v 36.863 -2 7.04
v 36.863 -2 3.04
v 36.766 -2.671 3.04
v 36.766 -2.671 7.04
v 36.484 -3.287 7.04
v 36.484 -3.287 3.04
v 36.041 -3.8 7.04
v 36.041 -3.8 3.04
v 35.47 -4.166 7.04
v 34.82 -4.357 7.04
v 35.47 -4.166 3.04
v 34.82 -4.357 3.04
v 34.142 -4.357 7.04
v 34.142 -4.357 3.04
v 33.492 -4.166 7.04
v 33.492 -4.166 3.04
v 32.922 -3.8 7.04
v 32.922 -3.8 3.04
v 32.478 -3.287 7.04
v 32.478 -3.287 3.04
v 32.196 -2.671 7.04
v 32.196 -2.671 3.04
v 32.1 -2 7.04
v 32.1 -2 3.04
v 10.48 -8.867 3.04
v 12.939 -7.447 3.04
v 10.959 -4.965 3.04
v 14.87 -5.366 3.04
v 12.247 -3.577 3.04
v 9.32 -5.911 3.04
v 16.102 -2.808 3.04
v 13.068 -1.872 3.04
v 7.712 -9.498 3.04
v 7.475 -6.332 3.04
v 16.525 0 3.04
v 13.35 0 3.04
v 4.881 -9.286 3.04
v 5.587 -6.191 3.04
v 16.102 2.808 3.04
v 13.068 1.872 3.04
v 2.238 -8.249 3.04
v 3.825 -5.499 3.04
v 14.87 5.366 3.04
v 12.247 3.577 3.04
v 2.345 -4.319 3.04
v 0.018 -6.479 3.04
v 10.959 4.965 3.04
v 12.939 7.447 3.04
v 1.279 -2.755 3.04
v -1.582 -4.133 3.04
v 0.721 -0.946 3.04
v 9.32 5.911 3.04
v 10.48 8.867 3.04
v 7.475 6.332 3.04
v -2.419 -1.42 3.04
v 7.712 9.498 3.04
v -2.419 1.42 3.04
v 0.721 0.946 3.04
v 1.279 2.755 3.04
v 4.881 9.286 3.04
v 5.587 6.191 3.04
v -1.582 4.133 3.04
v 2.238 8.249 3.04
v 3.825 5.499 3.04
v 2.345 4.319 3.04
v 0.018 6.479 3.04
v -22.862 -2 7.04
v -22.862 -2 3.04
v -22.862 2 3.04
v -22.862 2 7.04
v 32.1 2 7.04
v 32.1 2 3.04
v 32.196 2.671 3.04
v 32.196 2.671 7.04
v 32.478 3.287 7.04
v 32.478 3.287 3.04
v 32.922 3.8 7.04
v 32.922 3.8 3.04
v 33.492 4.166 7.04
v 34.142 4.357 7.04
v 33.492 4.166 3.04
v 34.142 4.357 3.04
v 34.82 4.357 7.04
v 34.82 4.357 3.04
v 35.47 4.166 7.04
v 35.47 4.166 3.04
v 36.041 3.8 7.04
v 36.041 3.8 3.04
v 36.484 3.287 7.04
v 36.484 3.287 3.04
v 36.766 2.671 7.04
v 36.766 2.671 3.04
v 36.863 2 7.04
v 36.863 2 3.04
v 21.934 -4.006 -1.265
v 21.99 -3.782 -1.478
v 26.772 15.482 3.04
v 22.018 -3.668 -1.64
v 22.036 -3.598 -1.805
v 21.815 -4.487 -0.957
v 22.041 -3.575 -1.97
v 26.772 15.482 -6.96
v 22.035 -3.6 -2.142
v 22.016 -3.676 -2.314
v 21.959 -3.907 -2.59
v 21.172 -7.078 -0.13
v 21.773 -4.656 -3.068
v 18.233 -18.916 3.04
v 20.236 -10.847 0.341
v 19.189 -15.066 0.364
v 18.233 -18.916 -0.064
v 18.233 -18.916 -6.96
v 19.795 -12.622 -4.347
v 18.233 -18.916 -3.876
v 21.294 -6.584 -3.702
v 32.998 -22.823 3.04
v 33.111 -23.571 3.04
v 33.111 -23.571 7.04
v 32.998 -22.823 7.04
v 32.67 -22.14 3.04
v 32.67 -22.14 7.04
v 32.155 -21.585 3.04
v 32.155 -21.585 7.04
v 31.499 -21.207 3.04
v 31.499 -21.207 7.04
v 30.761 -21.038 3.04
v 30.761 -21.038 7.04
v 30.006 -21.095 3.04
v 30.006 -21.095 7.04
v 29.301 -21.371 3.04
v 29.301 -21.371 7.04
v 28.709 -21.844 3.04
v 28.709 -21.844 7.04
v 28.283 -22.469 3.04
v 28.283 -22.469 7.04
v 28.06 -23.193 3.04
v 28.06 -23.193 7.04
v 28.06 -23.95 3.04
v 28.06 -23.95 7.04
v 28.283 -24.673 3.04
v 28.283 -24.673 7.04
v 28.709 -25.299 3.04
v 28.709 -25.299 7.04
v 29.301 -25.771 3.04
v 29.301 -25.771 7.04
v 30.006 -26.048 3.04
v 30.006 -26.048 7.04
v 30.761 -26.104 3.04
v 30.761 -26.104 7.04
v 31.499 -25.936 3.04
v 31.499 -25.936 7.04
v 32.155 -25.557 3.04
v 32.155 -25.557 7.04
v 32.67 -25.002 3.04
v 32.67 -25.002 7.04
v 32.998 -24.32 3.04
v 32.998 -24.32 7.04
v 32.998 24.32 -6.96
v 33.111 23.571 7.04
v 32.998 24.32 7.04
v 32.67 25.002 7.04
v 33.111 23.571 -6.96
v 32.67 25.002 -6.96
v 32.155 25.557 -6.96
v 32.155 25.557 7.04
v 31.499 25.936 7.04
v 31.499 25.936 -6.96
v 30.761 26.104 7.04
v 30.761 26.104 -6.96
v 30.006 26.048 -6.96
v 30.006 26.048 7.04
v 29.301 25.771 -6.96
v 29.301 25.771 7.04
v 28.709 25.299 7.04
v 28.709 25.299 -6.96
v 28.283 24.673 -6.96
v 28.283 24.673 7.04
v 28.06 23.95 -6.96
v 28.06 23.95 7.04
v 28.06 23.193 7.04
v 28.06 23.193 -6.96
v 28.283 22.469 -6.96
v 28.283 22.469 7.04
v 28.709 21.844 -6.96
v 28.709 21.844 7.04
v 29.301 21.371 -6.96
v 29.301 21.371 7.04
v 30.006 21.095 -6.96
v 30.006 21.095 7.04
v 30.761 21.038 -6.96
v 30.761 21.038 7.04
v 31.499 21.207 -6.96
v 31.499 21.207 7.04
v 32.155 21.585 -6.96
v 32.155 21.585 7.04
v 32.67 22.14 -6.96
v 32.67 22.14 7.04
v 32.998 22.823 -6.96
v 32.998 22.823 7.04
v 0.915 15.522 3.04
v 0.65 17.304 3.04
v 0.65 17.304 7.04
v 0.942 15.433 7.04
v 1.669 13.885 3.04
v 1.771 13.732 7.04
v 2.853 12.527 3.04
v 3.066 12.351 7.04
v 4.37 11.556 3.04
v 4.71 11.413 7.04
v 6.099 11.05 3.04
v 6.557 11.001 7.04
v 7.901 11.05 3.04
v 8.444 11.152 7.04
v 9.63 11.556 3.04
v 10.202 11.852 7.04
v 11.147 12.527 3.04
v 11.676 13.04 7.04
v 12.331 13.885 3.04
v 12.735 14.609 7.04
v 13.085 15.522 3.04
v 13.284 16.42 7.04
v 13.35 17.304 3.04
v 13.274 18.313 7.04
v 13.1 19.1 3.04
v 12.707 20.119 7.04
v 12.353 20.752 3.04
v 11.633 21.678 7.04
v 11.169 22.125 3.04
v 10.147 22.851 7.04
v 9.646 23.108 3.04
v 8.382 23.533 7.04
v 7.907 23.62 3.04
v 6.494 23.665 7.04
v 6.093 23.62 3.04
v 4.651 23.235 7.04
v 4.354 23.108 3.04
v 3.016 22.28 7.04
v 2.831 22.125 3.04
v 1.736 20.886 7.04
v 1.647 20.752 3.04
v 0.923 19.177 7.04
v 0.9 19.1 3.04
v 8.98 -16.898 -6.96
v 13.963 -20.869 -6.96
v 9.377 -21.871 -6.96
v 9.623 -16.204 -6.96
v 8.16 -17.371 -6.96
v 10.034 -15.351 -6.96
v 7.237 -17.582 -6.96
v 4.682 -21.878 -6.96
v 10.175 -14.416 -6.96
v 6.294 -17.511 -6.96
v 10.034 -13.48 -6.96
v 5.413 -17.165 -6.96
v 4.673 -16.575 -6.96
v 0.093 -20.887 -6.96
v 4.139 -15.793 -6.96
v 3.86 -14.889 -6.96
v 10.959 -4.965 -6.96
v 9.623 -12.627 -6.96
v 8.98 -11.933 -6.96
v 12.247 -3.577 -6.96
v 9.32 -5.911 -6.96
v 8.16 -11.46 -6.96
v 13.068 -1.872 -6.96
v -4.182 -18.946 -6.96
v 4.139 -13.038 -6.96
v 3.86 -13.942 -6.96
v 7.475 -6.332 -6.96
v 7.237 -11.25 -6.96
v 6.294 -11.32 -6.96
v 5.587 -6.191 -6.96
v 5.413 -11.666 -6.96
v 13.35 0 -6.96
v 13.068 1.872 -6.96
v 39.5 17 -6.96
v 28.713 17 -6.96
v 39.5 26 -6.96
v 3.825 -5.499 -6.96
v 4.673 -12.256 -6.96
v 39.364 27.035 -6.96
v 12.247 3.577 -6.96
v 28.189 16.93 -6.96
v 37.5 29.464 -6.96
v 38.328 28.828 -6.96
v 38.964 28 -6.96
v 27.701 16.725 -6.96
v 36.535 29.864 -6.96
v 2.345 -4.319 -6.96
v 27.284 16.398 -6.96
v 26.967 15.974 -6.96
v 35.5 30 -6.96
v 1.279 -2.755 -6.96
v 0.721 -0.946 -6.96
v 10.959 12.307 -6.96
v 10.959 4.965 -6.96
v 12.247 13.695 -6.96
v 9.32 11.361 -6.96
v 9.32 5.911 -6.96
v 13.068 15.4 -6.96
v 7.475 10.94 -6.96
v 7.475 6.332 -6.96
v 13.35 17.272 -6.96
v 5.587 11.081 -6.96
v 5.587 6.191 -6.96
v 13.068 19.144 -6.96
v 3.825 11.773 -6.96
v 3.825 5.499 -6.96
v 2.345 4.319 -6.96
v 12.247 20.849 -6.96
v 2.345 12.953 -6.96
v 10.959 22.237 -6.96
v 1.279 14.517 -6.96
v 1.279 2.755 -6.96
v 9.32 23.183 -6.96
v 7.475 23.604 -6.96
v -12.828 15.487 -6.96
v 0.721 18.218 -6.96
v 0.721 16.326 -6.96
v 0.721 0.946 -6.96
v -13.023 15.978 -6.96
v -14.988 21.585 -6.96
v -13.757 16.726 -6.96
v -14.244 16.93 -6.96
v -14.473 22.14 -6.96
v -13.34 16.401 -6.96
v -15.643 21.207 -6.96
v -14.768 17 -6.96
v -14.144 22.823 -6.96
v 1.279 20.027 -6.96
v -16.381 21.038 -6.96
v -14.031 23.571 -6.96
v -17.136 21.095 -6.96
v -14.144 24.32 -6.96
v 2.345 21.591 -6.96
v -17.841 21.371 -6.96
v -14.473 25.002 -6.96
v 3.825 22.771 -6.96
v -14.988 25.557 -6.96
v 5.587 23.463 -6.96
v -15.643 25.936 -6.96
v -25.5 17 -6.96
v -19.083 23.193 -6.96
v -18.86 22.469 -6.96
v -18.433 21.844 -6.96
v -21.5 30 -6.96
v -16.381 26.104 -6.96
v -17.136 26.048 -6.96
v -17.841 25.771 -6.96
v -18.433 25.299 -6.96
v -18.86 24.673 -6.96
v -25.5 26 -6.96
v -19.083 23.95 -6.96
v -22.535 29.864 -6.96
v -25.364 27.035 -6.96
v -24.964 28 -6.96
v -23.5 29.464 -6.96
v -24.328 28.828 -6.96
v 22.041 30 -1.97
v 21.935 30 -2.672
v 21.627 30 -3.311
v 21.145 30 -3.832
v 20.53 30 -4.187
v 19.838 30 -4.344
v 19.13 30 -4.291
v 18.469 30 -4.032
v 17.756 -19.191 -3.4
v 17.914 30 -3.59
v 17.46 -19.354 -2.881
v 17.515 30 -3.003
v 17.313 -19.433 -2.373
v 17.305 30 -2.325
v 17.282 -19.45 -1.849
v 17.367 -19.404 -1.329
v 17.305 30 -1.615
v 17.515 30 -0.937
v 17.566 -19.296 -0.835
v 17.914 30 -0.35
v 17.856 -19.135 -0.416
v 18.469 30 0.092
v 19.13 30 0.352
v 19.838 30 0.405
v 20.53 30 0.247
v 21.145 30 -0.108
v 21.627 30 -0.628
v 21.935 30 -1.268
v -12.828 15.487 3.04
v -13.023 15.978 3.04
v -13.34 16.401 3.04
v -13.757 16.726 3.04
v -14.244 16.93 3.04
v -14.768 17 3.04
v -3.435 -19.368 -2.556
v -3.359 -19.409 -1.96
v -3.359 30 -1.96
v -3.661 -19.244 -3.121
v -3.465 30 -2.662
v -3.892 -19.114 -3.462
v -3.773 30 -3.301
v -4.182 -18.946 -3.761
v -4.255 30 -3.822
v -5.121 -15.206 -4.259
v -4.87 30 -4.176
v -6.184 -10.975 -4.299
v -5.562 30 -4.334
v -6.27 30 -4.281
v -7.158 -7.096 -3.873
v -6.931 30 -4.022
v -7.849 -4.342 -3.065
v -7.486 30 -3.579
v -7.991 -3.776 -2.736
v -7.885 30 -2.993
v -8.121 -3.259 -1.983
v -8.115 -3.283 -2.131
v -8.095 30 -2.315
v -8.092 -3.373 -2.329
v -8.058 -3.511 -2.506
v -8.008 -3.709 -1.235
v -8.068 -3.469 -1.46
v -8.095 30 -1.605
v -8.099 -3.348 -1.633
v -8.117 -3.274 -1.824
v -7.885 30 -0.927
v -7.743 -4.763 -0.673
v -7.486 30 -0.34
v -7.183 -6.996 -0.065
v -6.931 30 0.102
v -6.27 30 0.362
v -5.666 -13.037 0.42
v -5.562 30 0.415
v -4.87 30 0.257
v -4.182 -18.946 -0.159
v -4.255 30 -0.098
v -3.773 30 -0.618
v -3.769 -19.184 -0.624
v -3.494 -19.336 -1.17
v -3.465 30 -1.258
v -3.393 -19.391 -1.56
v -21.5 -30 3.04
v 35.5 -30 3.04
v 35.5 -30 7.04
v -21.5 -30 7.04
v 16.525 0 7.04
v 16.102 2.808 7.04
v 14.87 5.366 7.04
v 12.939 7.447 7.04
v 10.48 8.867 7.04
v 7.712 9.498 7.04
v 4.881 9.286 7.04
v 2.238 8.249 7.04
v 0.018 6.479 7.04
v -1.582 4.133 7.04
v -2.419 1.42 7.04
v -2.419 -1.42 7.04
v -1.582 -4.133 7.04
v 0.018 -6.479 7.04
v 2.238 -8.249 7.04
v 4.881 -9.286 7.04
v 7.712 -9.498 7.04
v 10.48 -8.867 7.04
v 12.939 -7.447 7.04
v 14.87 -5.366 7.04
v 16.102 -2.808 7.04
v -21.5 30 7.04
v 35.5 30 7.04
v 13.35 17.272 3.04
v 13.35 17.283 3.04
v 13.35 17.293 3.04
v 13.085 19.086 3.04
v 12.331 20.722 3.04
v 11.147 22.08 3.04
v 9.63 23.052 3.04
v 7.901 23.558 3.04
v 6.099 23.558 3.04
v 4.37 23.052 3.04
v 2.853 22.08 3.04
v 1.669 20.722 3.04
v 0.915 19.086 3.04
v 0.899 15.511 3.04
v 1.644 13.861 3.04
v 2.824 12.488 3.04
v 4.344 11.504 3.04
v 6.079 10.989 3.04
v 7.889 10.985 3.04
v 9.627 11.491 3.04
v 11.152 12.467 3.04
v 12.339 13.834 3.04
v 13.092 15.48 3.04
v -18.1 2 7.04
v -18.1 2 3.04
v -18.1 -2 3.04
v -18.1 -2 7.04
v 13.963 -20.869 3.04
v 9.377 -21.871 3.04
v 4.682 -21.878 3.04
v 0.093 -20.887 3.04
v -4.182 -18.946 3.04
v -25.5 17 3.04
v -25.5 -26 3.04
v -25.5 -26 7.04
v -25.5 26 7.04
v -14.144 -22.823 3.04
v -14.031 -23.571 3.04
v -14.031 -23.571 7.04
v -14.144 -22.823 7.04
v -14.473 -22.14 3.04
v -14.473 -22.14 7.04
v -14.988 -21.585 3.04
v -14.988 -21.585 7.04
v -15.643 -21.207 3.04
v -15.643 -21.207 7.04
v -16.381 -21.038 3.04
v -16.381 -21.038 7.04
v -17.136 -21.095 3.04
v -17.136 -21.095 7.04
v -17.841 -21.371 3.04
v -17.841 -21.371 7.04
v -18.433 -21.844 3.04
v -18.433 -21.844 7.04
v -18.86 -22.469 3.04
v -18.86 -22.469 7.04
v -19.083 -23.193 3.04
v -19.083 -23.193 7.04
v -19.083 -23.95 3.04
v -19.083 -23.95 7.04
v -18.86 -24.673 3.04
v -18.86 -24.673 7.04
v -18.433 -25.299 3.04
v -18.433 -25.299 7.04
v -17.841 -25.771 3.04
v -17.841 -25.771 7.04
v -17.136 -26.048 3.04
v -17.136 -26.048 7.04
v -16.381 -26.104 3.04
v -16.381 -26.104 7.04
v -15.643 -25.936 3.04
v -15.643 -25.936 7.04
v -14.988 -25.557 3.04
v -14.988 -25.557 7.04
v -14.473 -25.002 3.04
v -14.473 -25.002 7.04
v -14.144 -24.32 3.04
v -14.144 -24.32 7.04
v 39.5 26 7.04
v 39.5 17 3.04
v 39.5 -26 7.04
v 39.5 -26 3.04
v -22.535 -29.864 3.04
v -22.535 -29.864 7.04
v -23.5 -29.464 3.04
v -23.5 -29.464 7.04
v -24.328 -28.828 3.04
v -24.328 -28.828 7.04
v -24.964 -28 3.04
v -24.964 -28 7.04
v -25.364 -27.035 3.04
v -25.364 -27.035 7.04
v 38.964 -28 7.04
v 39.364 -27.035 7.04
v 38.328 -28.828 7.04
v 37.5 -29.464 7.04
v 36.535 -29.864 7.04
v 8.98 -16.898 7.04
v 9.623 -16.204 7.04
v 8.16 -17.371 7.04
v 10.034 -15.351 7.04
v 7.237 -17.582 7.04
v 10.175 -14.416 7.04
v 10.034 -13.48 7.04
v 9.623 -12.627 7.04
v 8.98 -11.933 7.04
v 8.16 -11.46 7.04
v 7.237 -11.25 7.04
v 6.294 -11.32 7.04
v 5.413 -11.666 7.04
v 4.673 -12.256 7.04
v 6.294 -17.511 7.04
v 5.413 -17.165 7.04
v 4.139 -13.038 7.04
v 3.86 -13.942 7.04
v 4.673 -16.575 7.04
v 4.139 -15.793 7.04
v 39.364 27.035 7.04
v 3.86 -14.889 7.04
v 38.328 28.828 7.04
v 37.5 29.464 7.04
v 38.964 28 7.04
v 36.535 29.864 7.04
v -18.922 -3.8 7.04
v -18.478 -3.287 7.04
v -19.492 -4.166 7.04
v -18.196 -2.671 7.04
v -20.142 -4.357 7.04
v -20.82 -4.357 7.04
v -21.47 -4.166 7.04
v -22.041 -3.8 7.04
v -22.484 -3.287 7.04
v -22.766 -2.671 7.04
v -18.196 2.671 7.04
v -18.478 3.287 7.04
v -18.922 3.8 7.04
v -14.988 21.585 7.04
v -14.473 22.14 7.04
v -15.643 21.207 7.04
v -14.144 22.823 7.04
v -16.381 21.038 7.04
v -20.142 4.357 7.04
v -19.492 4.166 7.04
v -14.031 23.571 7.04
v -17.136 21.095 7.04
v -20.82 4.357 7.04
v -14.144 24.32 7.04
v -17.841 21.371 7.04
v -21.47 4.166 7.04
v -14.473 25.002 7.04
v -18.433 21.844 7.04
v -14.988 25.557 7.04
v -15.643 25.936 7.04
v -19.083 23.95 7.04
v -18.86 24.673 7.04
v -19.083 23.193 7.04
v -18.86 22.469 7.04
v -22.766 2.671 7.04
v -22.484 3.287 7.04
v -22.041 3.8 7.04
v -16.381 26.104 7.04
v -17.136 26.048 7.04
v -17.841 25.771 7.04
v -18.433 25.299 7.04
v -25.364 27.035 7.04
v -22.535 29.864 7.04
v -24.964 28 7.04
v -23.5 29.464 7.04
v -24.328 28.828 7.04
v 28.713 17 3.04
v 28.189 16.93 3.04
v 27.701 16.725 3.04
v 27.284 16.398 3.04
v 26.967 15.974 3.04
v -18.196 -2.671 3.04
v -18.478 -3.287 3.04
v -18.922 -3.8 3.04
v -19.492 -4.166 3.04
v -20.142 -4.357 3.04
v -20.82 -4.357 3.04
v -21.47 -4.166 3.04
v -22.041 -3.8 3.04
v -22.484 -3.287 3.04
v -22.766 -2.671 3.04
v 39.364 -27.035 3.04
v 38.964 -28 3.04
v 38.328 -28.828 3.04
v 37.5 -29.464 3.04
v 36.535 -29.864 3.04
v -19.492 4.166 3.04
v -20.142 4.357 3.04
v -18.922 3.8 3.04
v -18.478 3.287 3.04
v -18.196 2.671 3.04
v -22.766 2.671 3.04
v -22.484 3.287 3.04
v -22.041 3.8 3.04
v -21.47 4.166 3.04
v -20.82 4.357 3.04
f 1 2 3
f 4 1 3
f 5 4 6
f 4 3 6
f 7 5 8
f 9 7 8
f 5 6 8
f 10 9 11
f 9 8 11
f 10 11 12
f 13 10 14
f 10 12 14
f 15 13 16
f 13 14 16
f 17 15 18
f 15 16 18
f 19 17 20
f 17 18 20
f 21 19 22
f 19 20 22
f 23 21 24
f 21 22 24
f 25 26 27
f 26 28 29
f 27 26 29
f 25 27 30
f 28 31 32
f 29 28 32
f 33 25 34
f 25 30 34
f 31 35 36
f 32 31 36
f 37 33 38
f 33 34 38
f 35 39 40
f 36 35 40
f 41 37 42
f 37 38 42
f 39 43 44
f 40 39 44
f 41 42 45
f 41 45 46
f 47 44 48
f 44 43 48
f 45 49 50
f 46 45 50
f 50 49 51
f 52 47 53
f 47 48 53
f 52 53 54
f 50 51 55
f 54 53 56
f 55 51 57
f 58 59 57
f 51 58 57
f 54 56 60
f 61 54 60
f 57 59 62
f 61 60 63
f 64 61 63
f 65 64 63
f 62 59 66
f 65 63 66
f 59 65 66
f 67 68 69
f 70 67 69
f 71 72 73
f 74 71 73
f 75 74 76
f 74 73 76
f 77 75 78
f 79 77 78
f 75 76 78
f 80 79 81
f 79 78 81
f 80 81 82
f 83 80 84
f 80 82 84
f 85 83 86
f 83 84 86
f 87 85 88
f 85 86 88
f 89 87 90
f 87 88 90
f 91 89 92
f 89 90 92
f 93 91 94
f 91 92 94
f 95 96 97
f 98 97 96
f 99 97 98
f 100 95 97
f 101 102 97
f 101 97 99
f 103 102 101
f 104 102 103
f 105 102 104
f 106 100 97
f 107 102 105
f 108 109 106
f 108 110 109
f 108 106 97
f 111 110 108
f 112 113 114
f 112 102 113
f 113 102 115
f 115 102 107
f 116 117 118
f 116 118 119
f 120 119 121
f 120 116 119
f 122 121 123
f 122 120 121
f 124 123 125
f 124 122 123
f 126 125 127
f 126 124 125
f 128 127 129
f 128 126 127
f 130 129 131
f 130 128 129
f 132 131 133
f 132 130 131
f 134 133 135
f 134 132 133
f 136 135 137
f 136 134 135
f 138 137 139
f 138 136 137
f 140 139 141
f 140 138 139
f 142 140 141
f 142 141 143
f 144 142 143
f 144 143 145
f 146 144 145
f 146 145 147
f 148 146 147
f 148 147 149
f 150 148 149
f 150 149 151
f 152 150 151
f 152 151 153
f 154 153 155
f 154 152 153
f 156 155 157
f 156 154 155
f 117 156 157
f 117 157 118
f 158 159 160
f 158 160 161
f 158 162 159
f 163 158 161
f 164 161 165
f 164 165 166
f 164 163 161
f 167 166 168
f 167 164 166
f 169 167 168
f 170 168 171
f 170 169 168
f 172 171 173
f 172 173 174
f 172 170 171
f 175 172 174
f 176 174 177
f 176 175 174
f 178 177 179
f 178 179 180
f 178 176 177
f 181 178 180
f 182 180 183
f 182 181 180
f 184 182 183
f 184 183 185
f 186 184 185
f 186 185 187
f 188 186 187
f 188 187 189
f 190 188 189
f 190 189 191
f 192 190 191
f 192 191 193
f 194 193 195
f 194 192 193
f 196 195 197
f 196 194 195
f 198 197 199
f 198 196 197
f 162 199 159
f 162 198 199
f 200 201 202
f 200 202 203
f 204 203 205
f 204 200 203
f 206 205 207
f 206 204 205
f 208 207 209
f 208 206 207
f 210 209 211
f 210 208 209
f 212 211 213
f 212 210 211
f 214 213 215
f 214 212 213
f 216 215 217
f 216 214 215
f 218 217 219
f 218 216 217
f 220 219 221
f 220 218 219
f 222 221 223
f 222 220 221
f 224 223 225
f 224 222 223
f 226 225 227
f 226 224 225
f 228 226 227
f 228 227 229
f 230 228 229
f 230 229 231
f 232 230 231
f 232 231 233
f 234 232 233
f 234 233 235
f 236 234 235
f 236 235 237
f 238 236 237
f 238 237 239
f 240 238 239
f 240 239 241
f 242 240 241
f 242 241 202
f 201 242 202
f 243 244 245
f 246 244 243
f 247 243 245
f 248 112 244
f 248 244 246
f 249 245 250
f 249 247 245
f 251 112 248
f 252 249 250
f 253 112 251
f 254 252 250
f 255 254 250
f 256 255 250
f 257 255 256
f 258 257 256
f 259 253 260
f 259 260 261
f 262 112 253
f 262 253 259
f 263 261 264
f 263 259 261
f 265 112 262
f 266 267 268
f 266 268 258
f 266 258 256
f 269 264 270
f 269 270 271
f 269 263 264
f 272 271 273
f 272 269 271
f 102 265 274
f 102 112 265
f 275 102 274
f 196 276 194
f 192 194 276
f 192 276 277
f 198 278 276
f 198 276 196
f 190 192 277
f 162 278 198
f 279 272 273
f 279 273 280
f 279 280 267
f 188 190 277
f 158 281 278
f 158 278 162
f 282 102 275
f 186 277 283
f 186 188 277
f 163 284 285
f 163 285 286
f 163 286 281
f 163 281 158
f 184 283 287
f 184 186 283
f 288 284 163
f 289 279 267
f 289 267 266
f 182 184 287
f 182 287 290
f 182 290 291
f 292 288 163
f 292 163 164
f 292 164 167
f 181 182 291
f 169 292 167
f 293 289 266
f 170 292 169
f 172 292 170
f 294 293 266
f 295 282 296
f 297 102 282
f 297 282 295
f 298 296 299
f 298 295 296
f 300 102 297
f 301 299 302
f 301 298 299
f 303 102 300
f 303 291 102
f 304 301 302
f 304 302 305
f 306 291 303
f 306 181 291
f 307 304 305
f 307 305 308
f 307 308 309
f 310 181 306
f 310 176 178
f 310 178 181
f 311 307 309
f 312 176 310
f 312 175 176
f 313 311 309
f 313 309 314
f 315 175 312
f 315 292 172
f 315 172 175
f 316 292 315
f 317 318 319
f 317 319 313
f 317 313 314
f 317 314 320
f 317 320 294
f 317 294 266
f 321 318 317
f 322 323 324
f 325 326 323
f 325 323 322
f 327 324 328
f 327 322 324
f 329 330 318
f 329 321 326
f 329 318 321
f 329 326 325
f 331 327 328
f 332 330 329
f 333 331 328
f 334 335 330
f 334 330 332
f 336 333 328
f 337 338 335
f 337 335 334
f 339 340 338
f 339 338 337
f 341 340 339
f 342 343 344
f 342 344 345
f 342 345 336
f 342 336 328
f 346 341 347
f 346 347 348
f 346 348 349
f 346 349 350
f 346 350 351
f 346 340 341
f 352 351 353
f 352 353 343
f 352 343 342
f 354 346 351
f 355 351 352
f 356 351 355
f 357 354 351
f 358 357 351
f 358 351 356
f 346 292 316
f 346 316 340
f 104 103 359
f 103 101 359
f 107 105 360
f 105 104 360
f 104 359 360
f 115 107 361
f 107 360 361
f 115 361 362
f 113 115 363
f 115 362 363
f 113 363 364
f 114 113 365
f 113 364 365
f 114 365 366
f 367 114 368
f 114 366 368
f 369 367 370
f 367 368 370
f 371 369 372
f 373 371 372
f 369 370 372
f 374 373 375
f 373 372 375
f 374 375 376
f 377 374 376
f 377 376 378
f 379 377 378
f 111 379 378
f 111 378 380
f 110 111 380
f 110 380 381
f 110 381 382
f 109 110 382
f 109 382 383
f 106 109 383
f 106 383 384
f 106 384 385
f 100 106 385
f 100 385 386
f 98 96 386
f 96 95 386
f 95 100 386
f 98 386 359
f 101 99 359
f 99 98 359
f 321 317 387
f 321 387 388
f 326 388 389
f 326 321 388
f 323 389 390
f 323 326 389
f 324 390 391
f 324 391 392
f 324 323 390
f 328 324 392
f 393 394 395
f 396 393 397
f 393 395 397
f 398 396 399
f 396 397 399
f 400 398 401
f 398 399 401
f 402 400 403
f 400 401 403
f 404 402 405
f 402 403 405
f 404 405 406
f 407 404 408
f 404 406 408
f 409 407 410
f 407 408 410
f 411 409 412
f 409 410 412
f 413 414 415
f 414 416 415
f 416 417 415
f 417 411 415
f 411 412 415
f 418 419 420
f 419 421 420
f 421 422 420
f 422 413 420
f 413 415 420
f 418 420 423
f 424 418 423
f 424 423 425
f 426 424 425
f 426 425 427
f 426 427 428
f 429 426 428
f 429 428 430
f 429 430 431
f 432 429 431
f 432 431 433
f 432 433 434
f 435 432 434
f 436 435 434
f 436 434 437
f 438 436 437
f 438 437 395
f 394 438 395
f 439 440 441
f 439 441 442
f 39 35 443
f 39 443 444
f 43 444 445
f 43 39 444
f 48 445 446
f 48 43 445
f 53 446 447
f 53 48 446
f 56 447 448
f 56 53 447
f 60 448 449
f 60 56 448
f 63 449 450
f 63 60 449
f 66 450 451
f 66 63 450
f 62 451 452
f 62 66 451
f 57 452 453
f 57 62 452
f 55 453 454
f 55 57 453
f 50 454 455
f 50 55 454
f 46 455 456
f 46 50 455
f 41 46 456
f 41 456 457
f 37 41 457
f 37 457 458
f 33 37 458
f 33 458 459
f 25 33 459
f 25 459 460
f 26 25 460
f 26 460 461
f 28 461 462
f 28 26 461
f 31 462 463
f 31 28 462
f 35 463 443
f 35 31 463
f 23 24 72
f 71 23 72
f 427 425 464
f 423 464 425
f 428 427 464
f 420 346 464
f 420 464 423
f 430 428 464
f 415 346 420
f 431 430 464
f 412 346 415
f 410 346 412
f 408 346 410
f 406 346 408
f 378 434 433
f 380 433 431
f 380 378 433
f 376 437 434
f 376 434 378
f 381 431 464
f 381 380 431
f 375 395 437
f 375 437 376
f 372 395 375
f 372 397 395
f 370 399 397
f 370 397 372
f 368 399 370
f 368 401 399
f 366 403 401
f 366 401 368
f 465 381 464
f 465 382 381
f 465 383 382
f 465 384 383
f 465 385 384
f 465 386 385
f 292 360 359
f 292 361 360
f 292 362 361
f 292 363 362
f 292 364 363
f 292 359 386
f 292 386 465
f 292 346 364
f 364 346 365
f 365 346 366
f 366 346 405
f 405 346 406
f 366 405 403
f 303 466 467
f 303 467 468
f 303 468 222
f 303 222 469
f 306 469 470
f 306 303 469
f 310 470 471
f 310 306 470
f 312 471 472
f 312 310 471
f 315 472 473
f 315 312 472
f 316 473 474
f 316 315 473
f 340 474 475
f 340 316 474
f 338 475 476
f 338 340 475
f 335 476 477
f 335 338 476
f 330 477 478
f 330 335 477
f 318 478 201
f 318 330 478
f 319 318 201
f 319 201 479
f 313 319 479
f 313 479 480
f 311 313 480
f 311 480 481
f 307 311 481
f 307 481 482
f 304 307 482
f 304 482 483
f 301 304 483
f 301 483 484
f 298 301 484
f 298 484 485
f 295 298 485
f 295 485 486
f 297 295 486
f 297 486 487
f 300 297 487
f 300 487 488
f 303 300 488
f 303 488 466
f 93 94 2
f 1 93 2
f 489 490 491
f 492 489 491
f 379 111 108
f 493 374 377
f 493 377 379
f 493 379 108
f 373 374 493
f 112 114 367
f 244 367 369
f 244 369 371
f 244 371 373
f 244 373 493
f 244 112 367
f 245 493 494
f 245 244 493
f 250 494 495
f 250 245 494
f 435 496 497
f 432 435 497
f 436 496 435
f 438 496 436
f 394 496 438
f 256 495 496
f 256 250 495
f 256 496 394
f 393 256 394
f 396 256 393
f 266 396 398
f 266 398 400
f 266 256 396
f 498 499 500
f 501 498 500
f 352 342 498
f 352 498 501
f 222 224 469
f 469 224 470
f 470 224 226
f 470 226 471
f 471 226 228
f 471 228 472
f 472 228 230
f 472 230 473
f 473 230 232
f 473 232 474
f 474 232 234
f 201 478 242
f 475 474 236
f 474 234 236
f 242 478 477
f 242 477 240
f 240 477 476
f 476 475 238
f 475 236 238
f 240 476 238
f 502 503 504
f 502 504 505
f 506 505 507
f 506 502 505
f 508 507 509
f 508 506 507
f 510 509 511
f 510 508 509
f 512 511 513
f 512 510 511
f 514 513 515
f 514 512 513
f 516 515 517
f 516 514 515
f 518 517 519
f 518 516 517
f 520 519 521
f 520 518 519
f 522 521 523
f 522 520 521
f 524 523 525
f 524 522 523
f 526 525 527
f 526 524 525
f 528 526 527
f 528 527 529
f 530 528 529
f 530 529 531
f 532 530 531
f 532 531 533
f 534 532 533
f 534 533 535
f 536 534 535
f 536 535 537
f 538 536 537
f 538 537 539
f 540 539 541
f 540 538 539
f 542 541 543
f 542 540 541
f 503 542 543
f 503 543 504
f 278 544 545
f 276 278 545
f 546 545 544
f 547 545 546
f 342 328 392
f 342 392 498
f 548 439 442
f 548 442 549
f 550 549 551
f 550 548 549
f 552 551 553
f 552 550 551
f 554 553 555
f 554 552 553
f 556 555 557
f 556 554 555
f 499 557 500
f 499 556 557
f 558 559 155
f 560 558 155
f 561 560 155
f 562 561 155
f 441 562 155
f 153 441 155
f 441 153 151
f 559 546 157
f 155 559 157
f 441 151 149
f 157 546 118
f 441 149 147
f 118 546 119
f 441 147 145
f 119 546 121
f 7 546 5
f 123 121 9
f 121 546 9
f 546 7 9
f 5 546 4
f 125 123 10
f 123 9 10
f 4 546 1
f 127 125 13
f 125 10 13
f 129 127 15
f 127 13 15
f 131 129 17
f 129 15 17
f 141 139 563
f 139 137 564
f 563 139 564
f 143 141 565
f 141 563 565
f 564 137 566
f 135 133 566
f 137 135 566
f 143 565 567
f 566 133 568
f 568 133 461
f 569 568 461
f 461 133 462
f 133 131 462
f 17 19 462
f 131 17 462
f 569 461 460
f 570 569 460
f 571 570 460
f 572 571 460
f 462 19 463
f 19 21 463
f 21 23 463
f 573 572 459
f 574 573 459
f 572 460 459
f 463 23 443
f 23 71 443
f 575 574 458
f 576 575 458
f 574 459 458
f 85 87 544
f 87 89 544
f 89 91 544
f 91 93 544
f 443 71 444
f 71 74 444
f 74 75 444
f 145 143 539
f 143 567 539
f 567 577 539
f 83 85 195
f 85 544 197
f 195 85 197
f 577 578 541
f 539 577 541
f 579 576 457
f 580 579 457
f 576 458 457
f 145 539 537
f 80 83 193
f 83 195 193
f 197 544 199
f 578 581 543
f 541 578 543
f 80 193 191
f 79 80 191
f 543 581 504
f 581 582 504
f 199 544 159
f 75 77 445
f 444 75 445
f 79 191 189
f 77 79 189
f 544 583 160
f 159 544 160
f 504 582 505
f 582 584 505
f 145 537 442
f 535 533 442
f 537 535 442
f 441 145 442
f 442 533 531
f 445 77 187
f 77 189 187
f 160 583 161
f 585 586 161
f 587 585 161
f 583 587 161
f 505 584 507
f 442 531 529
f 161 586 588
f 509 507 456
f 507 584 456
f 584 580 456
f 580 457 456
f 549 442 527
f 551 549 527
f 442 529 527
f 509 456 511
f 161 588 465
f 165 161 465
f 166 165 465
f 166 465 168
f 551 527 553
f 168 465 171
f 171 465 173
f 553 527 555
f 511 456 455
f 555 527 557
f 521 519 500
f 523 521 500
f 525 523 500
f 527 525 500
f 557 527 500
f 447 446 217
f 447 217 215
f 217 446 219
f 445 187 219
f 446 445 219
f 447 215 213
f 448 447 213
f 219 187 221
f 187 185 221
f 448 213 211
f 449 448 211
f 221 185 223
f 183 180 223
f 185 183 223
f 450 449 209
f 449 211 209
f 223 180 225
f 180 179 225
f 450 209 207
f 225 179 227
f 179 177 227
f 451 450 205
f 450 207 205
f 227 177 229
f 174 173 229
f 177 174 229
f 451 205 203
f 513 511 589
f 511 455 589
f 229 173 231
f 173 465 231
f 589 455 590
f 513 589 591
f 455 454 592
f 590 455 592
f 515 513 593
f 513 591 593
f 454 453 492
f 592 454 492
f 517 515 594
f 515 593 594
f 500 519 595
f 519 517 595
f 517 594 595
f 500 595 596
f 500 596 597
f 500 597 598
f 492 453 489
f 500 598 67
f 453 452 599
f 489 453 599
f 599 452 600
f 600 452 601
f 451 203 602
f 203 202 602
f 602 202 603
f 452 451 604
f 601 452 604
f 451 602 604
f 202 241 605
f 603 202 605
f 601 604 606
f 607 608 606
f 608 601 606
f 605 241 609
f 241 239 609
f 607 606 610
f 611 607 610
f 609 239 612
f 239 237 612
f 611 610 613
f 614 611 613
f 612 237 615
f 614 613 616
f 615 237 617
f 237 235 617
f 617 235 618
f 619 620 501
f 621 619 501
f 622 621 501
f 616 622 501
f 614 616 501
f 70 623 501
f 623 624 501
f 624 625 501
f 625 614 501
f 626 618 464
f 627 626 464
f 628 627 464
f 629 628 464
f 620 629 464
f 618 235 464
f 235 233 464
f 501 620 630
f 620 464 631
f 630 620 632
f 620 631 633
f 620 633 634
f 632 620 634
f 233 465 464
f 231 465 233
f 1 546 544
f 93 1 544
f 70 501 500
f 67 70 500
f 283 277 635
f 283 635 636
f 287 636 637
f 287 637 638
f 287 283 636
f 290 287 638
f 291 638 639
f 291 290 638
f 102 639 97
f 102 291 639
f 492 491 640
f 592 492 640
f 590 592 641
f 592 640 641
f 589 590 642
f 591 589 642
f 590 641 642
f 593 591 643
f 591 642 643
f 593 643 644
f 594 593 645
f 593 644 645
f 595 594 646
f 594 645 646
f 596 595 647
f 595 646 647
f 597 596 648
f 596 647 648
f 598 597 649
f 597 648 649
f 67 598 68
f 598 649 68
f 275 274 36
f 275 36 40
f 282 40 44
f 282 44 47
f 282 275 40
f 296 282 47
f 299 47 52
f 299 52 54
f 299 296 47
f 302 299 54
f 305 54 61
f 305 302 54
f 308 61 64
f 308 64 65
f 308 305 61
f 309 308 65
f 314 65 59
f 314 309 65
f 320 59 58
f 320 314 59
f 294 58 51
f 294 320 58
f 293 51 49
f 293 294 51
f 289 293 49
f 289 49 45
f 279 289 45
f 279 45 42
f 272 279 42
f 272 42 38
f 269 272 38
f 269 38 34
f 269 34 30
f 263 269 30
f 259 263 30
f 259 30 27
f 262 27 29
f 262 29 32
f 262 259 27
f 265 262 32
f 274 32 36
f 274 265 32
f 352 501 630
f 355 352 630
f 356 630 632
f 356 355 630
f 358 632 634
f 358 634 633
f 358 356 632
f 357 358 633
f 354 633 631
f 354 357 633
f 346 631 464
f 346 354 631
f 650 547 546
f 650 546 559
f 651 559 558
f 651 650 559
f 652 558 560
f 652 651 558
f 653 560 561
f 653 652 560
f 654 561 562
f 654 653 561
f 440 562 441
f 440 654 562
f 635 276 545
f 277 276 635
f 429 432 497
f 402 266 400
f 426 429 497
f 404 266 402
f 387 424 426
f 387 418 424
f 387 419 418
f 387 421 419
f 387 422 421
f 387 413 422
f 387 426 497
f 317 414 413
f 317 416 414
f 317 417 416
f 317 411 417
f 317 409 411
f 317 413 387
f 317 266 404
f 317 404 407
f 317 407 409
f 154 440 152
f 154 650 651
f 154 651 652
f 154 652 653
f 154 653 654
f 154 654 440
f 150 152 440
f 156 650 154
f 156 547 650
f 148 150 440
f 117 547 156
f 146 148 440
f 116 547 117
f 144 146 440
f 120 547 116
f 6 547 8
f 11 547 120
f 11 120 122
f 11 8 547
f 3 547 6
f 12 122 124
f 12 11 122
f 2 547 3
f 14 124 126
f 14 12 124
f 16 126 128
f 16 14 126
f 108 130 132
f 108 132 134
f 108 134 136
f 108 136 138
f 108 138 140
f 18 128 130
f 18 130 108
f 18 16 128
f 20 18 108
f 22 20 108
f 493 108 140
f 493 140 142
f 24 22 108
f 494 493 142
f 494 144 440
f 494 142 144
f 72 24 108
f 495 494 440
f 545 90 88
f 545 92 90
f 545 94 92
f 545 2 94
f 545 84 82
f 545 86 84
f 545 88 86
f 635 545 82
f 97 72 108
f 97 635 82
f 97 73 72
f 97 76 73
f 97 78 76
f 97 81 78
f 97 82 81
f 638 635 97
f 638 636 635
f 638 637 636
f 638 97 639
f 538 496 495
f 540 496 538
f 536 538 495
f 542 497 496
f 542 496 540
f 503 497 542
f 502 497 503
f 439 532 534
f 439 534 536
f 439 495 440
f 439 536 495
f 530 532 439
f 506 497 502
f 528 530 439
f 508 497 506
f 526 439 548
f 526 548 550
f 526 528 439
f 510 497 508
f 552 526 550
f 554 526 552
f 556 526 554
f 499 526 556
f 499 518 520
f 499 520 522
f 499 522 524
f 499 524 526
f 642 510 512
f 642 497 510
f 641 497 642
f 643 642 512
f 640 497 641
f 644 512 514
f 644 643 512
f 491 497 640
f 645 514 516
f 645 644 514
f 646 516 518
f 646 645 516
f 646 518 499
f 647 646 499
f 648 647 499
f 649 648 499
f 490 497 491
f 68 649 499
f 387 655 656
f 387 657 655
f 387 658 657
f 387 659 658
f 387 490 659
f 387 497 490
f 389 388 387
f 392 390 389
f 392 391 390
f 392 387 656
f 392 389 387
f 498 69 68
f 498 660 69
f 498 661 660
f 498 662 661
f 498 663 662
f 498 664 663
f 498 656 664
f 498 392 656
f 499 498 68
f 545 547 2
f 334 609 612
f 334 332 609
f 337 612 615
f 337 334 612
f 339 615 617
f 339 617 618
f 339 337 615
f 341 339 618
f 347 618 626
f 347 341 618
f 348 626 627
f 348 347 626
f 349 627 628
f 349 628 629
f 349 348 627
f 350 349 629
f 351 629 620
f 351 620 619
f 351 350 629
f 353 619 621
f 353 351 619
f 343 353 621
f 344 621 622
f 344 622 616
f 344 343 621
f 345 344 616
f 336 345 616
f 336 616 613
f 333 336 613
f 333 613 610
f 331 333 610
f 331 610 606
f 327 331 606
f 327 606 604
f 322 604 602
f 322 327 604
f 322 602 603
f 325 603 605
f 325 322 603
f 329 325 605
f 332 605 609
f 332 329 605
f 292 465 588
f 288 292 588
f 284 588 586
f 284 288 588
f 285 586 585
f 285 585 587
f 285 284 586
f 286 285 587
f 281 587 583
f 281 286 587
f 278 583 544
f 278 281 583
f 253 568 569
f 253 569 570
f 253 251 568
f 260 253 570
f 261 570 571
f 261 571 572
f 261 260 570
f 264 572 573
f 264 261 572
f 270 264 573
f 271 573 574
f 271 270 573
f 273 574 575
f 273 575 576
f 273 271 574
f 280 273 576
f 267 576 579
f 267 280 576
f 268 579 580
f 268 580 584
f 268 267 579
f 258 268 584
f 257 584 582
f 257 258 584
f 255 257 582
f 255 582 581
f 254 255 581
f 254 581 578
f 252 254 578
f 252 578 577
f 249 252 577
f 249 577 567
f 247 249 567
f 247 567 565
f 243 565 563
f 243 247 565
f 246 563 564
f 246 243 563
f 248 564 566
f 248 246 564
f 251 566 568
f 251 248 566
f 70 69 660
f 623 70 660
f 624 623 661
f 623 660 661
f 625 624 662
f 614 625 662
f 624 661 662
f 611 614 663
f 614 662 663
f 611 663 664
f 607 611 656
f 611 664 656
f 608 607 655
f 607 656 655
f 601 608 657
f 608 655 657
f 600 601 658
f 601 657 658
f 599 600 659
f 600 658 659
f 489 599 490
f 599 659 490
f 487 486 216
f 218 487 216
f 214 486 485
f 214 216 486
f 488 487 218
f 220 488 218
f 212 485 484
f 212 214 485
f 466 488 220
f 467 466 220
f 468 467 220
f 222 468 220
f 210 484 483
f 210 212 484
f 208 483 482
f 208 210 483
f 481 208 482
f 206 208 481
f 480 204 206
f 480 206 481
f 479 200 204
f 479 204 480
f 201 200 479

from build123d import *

# Parameters (mm, degrees)
SKETCH3_R             = 6.35
SKETCH3_R_2           = 3.175
SKETCH3_R_3           = 2.54
BOSS_EXTRUDE1_DEPTH   = 10
SKETCH2_R             = 2.54
SKETCH2_R_2           = 9.525
SKETCH2_R_3           = 6.35
SKETCH2_R_4           = 3.175
BOSS_EXTRUDE2_DEPTH   = 4
BODY_MOVE_COPY1_ANGLE = 180
SKETCH6_R             = 2.38125
CUT_EXTRUDE1_DEPTH    = 60
BODY_MOVE_COPY2_ANGLE = 90


with BuildPart() as part:
    # Sketch3 → Boss-Extrude1 (new body)
    with BuildSketch(Plane(origin=(0, 0, 0), x_dir=(0, 0, -1), z_dir=(1, 0, 0))):
        with BuildLine():
            Line((19.772410398, 15.481894129), (11.232662335, -18.916334544))
            ThreePointArc((11.232662335, -18.916334544), (0.02933332, -21.999989892), (-11.182178927, -18.946220999))
            Line((-11.182178927, -18.946220999), (-19.828177454, 15.48706861))
            ThreePointArc((-19.828177454, 15.48706861), (-20.537949261, 16.577044264), (-21.767962021, 17))
            Line((-21.767962021, 17), (-32.5, 17))
            Line((-32.5, 17), (-32.5, 26))
            ThreePointArc((-32.5, 26), (-31.328427125, 28.828427125), (-28.5, 30))
            Line((-28.5, 30), (28.5, 30))
            ThreePointArc((28.5, 30), (31.328427125, 28.828427125), (32.5, 26))
            Line((32.5, 26), (32.5, 17))
            Line((32.5, 17), (21.713486916, 17))
            ThreePointArc((21.713486916, 17), (20.481372526, 16.575402846), (19.772410398, 15.481894129))
        make_face()
        Circle(SKETCH3_R, mode=Mode.SUBTRACT)
        with Locations((0, 17.272)):
            Circle(SKETCH3_R, mode=Mode.SUBTRACT)
        with Locations((0, -14.415625)):
            Circle(SKETCH3_R_2, mode=Mode.SUBTRACT)
        with Locations((-23.5712, 23.5712)):
            Circle(SKETCH3_R_3, mode=Mode.SUBTRACT)
        with Locations((23.5712, 23.5712)):
            Circle(SKETCH3_R_3, mode=Mode.SUBTRACT)
    extrude(amount=BOSS_EXTRUDE1_DEPTH)

    # Sketch2 → Boss-Extrude2 (add)
    with BuildSketch(Plane(origin=(10, 0, 0), x_dir=(0, 0, -1), z_dir=(1, 0, 0))):
        with BuildLine():
            Line((-28.5, 30), (28.5, 30))
            ThreePointArc((28.5, 30), (31.328427125, 28.828427125), (32.5, 26))
            Line((32.5, 26), (32.5, -26))
            ThreePointArc((32.5, -26), (31.328427125, -28.828427125), (28.5, -30))
            Line((28.5, -30), (-28.5, -30))
            ThreePointArc((-28.5, -30), (-31.328427125, -28.828427125), (-32.5, -26))
            Line((-32.5, -26), (-32.5, 26))
            ThreePointArc((-32.5, 26), (-31.328427125, 28.828427125), (-28.5, 30))
        make_face()
        with Locations((23.5712, 23.5712)):
            Circle(SKETCH2_R, mode=Mode.SUBTRACT)
        with Locations((-23.5712, 23.5712)):
            Circle(SKETCH2_R, mode=Mode.SUBTRACT)
        with Locations((-23.5712, -23.5712)):
            Circle(SKETCH2_R, mode=Mode.SUBTRACT)
        with Locations((23.5712, -23.5712)):
            Circle(SKETCH2_R, mode=Mode.SUBTRACT)
        Circle(SKETCH2_R_2, mode=Mode.SUBTRACT)
        with Locations(Location((0, 17.3355, 0), (0, 0, 180.286480091))):
            Circle(SKETCH2_R_3, mode=Mode.SUBTRACT)
        with Locations((0, -14.415625)):
            Circle(SKETCH2_R_4, mode=Mode.SUBTRACT)
        with BuildLine():
            Line((-29.8625, -2), (-29.8625, 2))
            ThreePointArc((-29.8625, 2), (-27.48125, 4.38125), (-25.1, 2))
            Line((-25.1, 2), (-25.1, -2))
            ThreePointArc((-25.1, -2), (-27.48125, -4.38125), (-29.8625, -2))
        make_face(mode=Mode.SUBTRACT)
        with BuildLine():
            Line((25.1, -2), (25.1, 2))
            ThreePointArc((25.1, 2), (27.48125, 4.38125), (29.8625, 2))
            Line((29.8625, 2), (29.8625, -2))
            ThreePointArc((29.8625, -2), (27.48125, -4.38125), (25.1, -2))
        make_face(mode=Mode.SUBTRACT)
    extrude(amount=BOSS_EXTRUDE2_DEPTH)


with BuildPart() as part_1:
    # Body-Move/Copy1: moved
    add(part.part.rotate(Axis((7, 0, 0.02), (0, 1, 0)), BODY_MOVE_COPY1_ANGLE))

    # Sketch6 → Cut-Extrude1 (cut)
    with BuildSketch(Plane(origin=(0, 30, 0), x_dir=(-1, 0, 0), z_dir=(0, 1, 0))):
        with Locations(Location((-8.999786825, -12.69999899, 0), (0, 0, 90))):
            Circle(SKETCH6_R)
        with Locations(Location((-9.00991527, 12.69999899, 0), (0, 0, 90))):
            Circle(SKETCH6_R)
    extrude(amount=-CUT_EXTRUDE1_DEPTH, mode=Mode.SUBTRACT)


with BuildPart() as part_2:
    # Body-Move/Copy2: moved
    add(part_1.part.rotate(Axis((7.0000125, 0, 0.04), (0, 1, 0)), BODY_MOVE_COPY2_ANGLE))


solid = part_2.part
